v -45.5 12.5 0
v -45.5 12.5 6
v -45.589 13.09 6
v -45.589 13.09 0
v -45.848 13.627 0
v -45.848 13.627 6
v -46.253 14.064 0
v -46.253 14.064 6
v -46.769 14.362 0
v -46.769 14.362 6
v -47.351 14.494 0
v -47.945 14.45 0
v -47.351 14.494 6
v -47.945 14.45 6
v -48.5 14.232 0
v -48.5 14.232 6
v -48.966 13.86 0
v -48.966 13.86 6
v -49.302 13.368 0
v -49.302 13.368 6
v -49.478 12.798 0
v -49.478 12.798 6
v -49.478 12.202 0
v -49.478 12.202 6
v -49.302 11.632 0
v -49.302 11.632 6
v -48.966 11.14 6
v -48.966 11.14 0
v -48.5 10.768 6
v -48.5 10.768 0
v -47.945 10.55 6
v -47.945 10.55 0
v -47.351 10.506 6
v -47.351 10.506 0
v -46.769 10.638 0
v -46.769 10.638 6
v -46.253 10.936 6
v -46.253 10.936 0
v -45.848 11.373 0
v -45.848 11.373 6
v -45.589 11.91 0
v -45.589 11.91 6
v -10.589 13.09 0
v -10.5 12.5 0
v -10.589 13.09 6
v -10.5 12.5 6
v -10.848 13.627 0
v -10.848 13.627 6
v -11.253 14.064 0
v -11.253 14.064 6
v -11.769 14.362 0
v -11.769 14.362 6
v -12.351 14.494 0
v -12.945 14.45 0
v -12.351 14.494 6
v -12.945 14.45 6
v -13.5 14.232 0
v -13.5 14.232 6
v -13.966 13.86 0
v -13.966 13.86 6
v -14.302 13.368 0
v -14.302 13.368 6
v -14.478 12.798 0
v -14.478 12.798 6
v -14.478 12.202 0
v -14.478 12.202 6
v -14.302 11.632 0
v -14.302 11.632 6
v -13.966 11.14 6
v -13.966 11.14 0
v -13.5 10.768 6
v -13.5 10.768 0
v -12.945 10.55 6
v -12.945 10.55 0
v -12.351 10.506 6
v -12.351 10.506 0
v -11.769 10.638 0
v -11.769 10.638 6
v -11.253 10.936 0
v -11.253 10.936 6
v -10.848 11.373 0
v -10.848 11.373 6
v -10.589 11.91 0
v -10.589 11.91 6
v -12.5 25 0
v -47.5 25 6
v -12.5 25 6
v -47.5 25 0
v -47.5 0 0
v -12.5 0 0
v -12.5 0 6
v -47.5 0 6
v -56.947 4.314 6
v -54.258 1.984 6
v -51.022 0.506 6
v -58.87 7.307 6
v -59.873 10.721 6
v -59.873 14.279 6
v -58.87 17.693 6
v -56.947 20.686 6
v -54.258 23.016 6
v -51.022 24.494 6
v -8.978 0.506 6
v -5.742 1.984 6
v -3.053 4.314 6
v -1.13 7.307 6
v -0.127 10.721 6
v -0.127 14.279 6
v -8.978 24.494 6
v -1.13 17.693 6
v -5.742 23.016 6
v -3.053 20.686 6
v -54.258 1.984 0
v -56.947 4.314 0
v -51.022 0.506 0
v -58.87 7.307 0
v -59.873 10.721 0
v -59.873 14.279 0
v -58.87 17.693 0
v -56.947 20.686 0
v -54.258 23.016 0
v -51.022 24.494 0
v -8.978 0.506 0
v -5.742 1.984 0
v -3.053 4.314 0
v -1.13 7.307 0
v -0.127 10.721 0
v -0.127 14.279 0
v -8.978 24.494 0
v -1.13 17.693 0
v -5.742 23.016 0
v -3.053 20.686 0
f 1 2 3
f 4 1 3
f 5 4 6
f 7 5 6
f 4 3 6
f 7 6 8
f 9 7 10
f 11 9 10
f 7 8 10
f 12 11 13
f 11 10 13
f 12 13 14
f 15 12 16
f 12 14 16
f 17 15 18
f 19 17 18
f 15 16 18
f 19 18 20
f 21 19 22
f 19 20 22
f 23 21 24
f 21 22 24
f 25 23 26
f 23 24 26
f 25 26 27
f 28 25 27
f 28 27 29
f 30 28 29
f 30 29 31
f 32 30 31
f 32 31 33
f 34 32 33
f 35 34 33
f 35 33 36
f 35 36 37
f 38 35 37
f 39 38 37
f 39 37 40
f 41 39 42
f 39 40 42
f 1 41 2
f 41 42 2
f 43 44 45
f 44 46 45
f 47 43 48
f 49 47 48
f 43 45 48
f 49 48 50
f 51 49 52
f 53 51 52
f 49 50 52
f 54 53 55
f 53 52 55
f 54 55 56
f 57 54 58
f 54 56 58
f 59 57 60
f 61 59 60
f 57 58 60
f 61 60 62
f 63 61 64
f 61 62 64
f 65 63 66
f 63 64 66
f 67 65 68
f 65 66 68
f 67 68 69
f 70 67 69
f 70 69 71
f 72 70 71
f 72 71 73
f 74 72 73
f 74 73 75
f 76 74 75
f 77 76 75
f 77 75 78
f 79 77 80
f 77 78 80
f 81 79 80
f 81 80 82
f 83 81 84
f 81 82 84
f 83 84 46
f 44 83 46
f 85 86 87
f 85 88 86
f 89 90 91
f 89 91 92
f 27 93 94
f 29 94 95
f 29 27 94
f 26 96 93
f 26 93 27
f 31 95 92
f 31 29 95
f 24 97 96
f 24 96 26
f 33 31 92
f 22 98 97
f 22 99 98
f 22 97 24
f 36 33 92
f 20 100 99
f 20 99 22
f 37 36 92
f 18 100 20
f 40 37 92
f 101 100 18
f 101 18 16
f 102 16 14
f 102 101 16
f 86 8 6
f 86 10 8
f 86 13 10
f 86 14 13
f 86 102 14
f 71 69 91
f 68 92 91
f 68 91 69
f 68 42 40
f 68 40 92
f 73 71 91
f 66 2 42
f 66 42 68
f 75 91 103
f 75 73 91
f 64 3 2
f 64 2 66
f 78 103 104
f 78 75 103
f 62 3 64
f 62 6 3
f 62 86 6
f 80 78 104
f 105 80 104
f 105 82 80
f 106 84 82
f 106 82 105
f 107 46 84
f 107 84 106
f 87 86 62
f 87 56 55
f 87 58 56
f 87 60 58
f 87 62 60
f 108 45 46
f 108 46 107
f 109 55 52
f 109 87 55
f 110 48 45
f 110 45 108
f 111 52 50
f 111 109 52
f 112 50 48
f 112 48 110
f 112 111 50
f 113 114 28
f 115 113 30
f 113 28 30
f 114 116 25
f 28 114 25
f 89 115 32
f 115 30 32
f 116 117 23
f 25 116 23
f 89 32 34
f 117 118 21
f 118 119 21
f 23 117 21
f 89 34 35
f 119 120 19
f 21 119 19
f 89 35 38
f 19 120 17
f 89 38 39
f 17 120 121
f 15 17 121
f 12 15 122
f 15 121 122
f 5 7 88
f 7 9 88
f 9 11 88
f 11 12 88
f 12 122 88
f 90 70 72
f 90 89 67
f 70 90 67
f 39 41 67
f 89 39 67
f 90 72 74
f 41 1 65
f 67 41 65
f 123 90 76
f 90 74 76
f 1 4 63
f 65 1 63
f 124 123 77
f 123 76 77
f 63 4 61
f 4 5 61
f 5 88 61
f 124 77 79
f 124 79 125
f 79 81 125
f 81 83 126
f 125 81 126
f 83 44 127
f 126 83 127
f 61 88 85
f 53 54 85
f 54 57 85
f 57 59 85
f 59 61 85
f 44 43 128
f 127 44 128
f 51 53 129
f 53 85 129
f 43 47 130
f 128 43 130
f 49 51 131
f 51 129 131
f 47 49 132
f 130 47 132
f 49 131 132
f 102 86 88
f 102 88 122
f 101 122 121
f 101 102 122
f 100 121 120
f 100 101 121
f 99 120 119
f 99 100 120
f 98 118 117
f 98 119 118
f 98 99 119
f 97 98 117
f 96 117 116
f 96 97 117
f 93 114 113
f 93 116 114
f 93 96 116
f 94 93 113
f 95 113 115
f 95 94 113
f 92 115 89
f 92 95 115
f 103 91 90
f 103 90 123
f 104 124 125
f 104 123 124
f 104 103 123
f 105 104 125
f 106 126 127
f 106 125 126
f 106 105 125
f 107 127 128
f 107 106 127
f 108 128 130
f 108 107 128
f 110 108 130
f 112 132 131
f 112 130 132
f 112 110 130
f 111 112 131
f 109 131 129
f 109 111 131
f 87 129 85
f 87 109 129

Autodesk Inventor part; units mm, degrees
ref_plane "YZ Plane" through (0, 0, 0) normal (1, 0, 0) x (0, 1, 0)
ref_plane "XZ Plane" through (0, 0, 0) normal (0, 1, 0) x (-1, 0, 0)
ref_plane "XY Plane" through (0, 0, 0) normal (0, 0, 1) x (1, 0, 0)
sketch "Sketch1" plane through (0, 0, 0) normal (0, 0, 1) x (1, 0, 0)
  line L0 (0, 0) -> (-60, 0)
  line L1 (-60, 0) -> (-60, 25)
  line L2 (-60, 25) -> (0, 25)
  line L3 (0, 25) -> (0, 0)
  dimension "d0" = 60
  dimension "d1" = 25
extrude "Extrusion3" add sketch "Sketch1" along normal blind 6
sketch "Sketch3" plane through (0, 0, 6) normal (0, 0, 1) x (1, 0, 0)
  circle A0 centre (-47.5, 12.5) radius 12.5
  line L0 (-60, 0) -> (0, 0) projected
  line L1 (-60, 25) -> (-60, 0) projected
  circle A1 centre (-12.5, 12.5) radius 12.5
  line L2 (0, 25) -> (-60, 25) projected
  line L3 (0, 0) -> (0, 25) projected
  circle A2 centre (-47.5, 12.5) radius 2
  circle A3 centre (-12.5, 12.5) radius 2
  point P0 (0, 12.5)
  point P1 (-12.5, 0)
  point P2 (-12.5, 25)
  point P3 (-47.5, 25)
  point P4 (-60, 12.5)
  point P5 (-47.5, 0)
  dimension "d16" = 25
  dimension "d17" = 12.5
  dimension "d18" = 12.5
  dimension "d19" = 25
  dimension "d20" = 12.5
  dimension "d21" = 12.5
  dimension "d22" = 4
  dimension "d23" = 4
extrude "Extrusion4" cut sketch "Sketch3" against normal blind 6 contours A0 L1 L2 | L0 L1 A0 | L2 L3 A1 | A1 L3 L0 | A2 | A3
properties part number "Middle"
